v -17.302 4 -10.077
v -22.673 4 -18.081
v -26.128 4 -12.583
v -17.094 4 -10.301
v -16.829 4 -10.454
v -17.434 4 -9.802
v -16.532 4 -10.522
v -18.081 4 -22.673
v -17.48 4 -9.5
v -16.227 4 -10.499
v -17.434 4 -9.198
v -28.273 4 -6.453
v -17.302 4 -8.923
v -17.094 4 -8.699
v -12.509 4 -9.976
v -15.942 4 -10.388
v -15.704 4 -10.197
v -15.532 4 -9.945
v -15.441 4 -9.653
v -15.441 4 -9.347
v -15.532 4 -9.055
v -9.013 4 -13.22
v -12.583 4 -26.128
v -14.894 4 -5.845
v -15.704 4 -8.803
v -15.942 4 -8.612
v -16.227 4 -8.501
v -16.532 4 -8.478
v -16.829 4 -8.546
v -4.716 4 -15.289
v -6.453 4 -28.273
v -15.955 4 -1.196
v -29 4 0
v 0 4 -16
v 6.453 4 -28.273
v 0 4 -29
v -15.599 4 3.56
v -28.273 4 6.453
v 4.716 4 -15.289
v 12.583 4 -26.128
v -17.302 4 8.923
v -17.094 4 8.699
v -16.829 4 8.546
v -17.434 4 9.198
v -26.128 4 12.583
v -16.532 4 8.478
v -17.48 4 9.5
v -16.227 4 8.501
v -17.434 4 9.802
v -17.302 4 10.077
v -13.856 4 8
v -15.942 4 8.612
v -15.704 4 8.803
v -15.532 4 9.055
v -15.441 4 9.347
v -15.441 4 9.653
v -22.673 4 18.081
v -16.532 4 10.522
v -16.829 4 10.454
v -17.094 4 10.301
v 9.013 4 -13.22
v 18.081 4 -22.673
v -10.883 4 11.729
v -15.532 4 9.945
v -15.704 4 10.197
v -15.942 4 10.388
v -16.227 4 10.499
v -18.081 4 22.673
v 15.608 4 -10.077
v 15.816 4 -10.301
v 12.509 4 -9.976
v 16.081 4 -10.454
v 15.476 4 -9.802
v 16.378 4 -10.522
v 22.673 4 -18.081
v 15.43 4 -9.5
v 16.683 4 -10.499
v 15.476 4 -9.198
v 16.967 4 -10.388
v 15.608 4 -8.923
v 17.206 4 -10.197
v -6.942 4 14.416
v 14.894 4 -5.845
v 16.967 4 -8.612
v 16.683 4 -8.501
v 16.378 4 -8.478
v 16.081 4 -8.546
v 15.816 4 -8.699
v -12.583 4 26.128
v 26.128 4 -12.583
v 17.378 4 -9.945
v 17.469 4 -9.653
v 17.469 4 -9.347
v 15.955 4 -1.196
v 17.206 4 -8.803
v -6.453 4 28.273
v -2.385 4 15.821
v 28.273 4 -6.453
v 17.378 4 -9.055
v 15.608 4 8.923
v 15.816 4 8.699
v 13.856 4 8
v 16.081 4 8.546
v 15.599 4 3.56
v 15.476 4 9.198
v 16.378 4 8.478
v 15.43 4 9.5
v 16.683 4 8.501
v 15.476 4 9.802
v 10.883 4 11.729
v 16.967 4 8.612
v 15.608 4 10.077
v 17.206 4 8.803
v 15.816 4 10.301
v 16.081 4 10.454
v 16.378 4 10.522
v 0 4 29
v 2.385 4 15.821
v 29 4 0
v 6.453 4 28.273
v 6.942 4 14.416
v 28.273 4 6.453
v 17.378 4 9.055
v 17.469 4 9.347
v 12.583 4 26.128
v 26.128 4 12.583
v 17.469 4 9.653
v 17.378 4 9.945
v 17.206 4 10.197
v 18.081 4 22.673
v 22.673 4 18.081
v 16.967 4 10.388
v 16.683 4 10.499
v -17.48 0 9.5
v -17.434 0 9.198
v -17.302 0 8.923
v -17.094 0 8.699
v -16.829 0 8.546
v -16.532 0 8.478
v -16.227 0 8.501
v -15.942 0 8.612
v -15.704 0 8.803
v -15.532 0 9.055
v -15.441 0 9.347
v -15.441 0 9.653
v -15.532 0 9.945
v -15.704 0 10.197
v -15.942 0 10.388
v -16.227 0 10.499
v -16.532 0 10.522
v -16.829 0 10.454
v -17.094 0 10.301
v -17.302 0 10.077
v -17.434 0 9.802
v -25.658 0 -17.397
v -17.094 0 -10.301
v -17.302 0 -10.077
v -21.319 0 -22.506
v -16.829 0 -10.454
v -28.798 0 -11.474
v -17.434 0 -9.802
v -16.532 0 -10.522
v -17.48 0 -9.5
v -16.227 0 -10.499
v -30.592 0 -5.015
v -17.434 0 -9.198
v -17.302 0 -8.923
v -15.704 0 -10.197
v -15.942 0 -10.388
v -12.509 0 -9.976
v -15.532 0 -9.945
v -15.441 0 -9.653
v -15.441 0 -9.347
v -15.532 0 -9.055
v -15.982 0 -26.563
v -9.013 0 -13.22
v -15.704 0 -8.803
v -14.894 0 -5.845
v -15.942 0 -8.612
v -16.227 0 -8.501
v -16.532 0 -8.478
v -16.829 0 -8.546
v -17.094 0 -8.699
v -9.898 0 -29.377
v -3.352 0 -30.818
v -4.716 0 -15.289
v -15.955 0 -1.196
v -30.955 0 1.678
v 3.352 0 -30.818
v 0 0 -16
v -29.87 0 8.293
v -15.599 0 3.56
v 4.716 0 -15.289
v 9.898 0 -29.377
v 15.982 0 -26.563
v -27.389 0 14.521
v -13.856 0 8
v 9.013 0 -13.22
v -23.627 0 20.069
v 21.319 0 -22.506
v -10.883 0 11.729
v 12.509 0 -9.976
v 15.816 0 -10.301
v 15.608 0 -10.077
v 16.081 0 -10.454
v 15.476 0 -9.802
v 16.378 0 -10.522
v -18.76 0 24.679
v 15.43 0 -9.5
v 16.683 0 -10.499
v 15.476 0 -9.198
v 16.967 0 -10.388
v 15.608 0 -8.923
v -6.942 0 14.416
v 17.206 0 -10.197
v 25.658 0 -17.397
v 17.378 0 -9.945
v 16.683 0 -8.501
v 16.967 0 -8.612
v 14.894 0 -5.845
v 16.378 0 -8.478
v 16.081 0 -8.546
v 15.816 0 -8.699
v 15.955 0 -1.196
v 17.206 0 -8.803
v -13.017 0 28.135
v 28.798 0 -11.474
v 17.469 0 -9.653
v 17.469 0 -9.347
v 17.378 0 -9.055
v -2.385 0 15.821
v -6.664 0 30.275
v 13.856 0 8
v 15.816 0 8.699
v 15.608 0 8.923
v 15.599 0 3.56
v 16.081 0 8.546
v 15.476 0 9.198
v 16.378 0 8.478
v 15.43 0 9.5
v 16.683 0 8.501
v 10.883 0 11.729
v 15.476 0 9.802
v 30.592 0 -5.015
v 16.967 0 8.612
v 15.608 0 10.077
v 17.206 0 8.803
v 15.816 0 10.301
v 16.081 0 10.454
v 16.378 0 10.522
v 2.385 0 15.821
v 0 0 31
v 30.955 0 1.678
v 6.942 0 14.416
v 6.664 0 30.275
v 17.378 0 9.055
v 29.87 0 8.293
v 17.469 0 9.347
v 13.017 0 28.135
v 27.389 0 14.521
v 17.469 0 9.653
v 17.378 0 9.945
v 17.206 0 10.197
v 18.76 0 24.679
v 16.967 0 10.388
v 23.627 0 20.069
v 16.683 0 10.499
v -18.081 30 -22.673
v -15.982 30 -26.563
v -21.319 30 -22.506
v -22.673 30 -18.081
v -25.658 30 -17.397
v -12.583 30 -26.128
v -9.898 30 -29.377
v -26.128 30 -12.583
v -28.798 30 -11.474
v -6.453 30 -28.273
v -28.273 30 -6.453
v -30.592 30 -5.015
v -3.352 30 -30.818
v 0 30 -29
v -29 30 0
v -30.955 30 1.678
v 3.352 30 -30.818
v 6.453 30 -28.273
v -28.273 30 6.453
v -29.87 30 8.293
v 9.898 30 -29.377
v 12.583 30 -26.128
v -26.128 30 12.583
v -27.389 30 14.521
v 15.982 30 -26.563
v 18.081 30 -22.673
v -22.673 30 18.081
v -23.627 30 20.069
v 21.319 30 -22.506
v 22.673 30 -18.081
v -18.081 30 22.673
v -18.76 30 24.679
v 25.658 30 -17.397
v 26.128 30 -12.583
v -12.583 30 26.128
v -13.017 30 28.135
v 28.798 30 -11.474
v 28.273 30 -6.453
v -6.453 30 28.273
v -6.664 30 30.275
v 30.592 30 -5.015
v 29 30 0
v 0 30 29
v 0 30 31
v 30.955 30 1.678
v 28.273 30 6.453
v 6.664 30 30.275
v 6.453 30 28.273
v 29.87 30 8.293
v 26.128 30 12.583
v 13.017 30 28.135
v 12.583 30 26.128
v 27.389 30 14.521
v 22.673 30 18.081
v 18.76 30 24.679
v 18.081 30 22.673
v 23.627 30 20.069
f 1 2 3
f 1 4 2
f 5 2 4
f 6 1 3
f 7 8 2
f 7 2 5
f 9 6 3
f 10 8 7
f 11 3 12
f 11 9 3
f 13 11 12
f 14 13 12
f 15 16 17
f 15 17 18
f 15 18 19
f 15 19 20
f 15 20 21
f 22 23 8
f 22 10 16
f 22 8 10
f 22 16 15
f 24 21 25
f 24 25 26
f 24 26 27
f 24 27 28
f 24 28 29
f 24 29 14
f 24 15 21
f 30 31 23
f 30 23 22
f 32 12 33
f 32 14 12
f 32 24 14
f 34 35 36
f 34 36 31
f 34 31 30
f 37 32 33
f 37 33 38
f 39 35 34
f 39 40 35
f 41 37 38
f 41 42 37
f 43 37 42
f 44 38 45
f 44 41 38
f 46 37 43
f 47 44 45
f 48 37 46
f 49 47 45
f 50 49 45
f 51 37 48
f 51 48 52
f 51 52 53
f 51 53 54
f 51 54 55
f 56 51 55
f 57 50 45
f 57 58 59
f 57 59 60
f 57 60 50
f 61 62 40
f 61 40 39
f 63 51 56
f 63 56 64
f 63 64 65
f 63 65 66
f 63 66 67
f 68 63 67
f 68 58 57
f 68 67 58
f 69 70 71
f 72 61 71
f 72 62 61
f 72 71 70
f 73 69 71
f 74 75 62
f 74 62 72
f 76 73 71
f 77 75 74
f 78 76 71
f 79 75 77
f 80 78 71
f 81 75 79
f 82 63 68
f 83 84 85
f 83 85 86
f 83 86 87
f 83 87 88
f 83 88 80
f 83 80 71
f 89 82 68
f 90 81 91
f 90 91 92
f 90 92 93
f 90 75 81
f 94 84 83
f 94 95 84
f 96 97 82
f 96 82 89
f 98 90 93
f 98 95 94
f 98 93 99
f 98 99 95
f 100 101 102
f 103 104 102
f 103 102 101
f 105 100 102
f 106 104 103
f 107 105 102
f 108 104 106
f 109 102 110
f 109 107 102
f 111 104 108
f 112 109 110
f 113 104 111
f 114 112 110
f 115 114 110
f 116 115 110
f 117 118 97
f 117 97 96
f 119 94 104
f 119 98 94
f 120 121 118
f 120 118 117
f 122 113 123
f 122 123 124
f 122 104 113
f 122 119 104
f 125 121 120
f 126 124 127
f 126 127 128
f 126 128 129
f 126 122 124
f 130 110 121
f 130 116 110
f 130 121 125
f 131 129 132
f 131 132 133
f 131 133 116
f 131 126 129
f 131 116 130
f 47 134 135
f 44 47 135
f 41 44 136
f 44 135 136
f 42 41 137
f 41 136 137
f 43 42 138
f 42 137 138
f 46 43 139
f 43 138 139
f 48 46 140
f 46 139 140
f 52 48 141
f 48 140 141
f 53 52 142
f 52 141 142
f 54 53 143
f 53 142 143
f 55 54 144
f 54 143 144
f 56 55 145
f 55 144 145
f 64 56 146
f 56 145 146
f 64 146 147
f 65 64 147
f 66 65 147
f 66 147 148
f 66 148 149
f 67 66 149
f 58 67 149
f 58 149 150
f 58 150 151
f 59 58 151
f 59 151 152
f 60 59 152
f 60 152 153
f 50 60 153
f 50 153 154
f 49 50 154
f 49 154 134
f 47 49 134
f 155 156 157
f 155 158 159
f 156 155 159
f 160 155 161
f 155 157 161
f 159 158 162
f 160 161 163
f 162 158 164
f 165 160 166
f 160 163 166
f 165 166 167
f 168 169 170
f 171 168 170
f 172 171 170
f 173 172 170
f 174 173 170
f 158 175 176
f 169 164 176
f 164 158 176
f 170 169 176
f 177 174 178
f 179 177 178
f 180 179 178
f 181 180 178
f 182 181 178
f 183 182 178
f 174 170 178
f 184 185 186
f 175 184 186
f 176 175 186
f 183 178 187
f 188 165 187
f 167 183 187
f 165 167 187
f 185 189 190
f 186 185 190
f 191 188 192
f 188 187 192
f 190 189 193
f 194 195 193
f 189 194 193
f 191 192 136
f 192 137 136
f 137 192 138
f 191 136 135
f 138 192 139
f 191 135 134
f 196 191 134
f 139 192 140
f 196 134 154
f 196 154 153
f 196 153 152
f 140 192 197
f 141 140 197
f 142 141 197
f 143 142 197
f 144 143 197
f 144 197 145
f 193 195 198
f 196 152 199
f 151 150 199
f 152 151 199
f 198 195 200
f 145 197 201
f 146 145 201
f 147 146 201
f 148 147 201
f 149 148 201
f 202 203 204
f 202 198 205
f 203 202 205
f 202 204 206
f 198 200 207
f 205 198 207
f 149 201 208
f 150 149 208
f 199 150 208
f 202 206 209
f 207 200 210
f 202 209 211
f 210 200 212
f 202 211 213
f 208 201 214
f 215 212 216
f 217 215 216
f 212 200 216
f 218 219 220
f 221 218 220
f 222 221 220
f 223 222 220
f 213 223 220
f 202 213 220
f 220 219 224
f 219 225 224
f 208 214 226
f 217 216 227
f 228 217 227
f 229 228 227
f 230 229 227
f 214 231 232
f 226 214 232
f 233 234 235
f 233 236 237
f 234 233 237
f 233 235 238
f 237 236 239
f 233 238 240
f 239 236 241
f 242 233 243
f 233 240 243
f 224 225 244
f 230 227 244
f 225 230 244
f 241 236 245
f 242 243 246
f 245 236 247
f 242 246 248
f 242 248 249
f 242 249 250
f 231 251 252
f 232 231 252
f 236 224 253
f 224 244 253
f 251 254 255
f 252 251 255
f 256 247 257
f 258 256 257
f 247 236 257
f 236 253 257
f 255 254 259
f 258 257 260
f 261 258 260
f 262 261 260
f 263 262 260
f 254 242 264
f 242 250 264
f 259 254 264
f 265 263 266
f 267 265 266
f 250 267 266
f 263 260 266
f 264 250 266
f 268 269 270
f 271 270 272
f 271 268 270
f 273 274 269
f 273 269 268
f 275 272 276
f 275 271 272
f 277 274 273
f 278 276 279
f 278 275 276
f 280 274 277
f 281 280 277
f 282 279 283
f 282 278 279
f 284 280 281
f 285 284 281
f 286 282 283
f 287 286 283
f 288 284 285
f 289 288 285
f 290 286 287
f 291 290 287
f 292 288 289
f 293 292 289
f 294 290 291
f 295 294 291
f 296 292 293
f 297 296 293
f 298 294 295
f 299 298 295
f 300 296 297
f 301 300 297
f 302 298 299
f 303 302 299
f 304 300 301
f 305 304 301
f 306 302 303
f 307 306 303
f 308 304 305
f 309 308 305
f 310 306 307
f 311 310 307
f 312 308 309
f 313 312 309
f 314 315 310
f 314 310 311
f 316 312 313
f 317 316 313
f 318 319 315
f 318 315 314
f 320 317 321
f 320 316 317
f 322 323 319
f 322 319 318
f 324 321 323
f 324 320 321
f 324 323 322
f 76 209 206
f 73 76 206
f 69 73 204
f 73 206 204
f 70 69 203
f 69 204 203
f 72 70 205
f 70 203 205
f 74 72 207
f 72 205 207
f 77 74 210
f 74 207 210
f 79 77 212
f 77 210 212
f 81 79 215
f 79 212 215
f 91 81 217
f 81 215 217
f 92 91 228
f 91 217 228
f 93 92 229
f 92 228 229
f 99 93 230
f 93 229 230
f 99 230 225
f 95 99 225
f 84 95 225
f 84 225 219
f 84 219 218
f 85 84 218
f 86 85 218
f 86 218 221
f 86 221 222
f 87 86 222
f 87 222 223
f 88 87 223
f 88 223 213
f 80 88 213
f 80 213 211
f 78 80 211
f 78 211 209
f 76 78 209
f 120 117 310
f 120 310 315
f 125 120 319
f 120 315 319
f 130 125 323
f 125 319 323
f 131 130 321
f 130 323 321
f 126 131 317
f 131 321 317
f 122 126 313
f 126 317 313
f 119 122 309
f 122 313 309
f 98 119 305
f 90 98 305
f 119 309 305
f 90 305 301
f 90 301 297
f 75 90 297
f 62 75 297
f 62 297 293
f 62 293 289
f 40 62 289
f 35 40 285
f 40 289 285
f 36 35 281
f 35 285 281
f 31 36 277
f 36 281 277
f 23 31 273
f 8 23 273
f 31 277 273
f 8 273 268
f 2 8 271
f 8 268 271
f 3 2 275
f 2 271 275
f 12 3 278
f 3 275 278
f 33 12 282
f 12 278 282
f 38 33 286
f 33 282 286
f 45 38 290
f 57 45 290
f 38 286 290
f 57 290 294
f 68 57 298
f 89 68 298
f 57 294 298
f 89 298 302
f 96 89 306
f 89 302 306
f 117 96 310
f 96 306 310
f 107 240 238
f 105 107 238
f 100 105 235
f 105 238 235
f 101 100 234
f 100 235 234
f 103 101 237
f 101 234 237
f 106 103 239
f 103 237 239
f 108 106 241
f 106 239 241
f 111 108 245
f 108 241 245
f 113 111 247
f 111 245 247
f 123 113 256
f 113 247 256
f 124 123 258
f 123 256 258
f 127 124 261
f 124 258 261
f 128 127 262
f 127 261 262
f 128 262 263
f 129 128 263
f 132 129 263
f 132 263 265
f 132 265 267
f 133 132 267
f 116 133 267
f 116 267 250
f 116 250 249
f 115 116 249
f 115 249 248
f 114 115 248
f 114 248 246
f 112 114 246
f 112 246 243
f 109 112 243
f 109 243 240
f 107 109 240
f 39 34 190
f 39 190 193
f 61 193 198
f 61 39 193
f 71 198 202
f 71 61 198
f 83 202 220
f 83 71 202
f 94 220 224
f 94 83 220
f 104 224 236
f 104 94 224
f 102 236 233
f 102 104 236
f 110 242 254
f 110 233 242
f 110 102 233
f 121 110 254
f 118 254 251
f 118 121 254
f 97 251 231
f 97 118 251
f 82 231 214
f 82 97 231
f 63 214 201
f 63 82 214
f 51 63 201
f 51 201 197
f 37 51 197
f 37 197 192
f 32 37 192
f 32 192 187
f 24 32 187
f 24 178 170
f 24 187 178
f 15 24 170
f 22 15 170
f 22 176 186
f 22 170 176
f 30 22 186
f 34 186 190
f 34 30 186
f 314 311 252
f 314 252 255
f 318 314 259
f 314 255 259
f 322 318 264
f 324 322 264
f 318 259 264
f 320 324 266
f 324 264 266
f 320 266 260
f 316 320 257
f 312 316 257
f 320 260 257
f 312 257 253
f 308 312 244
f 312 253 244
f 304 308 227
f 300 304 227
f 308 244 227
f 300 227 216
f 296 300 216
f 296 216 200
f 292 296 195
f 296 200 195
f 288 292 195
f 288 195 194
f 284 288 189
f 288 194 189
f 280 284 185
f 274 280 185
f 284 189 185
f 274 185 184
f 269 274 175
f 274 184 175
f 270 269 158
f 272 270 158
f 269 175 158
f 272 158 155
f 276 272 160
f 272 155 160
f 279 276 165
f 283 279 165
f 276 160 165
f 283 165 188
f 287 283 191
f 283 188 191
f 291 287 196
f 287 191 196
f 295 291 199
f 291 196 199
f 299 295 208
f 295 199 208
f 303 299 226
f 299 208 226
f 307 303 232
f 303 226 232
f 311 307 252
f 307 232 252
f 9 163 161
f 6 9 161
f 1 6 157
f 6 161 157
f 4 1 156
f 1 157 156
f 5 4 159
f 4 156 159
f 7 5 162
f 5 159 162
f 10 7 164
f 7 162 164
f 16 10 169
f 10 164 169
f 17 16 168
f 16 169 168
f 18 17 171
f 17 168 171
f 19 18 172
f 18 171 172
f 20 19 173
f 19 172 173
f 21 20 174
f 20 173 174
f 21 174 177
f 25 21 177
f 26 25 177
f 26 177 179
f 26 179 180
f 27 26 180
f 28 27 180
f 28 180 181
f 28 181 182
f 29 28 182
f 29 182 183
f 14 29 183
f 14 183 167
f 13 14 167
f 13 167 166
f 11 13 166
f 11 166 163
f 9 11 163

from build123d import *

# Parameters (mm, degrees)
SKETCH_1_R               = 31
EXTRUDE_1_DEPTH          = 30
CUT_EXTRUDE_3_DEPTH      = 51.467811524
CUT_EXTRUDE_3_DEPTH_BACK = 51.467811524
SKETCH_5_R               = 16
SKETCH_6_R               = 29
CUT_EXTRUDE_4_DEPTH      = 26
HOLE_WIZARD_M2_5_1_D     = 2.05


with BuildPart() as part:
    # 草图1 → 凸台-拉伸1 (new body)
    with BuildSketch(Plane(origin=(0, 0, 0), x_dir=(1, 0, 0), z_dir=(0, 1, 0))):
        with Locations(Location((0, 0, 0), (0, 0, 270))):
            Circle(SKETCH_1_R)
    extrude(amount=EXTRUDE_1_DEPTH)

    # 草图5 → 切除-拉伸3 (cut, two sides: drawn at the far end of the back side and taken through both)
    with BuildSketch(Plane(origin=(0, 5, 0), x_dir=(-1, 0, 0), z_dir=(0, -1, 0)).offset(-CUT_EXTRUDE_3_DEPTH_BACK)):
        with Locations(Location((0, 0, 0), (0, 0, 90))):
            Circle(SKETCH_5_R)
    extrude(amount=CUT_EXTRUDE_3_DEPTH + CUT_EXTRUDE_3_DEPTH_BACK, mode=Mode.SUBTRACT)

    # 草图6 → 切除-拉伸4 (cut)
    with BuildSketch(Plane(origin=(0, 30, 0), x_dir=(1, 0, 0), z_dir=(0, 1, 0))):
        with Locations(Location((0, 0, 0), (0, 0, 270))):
            Circle(SKETCH_6_R)
    extrude(amount=-CUT_EXTRUDE_4_DEPTH, mode=Mode.SUBTRACT)

    # M2.5 螺纹孔1 (through all)
    with Locations(Plane(origin=(0, 4, 0), x_dir=(1, 0, 0), z_dir=(0, 1, 0))):
        with Locations((-16.455, 9.5), (16.455, 9.5), (16.455, -9.5), (-16.455, -9.5)):
            Hole(HOLE_WIZARD_M2_5_1_D / 2)


solid = part.part
